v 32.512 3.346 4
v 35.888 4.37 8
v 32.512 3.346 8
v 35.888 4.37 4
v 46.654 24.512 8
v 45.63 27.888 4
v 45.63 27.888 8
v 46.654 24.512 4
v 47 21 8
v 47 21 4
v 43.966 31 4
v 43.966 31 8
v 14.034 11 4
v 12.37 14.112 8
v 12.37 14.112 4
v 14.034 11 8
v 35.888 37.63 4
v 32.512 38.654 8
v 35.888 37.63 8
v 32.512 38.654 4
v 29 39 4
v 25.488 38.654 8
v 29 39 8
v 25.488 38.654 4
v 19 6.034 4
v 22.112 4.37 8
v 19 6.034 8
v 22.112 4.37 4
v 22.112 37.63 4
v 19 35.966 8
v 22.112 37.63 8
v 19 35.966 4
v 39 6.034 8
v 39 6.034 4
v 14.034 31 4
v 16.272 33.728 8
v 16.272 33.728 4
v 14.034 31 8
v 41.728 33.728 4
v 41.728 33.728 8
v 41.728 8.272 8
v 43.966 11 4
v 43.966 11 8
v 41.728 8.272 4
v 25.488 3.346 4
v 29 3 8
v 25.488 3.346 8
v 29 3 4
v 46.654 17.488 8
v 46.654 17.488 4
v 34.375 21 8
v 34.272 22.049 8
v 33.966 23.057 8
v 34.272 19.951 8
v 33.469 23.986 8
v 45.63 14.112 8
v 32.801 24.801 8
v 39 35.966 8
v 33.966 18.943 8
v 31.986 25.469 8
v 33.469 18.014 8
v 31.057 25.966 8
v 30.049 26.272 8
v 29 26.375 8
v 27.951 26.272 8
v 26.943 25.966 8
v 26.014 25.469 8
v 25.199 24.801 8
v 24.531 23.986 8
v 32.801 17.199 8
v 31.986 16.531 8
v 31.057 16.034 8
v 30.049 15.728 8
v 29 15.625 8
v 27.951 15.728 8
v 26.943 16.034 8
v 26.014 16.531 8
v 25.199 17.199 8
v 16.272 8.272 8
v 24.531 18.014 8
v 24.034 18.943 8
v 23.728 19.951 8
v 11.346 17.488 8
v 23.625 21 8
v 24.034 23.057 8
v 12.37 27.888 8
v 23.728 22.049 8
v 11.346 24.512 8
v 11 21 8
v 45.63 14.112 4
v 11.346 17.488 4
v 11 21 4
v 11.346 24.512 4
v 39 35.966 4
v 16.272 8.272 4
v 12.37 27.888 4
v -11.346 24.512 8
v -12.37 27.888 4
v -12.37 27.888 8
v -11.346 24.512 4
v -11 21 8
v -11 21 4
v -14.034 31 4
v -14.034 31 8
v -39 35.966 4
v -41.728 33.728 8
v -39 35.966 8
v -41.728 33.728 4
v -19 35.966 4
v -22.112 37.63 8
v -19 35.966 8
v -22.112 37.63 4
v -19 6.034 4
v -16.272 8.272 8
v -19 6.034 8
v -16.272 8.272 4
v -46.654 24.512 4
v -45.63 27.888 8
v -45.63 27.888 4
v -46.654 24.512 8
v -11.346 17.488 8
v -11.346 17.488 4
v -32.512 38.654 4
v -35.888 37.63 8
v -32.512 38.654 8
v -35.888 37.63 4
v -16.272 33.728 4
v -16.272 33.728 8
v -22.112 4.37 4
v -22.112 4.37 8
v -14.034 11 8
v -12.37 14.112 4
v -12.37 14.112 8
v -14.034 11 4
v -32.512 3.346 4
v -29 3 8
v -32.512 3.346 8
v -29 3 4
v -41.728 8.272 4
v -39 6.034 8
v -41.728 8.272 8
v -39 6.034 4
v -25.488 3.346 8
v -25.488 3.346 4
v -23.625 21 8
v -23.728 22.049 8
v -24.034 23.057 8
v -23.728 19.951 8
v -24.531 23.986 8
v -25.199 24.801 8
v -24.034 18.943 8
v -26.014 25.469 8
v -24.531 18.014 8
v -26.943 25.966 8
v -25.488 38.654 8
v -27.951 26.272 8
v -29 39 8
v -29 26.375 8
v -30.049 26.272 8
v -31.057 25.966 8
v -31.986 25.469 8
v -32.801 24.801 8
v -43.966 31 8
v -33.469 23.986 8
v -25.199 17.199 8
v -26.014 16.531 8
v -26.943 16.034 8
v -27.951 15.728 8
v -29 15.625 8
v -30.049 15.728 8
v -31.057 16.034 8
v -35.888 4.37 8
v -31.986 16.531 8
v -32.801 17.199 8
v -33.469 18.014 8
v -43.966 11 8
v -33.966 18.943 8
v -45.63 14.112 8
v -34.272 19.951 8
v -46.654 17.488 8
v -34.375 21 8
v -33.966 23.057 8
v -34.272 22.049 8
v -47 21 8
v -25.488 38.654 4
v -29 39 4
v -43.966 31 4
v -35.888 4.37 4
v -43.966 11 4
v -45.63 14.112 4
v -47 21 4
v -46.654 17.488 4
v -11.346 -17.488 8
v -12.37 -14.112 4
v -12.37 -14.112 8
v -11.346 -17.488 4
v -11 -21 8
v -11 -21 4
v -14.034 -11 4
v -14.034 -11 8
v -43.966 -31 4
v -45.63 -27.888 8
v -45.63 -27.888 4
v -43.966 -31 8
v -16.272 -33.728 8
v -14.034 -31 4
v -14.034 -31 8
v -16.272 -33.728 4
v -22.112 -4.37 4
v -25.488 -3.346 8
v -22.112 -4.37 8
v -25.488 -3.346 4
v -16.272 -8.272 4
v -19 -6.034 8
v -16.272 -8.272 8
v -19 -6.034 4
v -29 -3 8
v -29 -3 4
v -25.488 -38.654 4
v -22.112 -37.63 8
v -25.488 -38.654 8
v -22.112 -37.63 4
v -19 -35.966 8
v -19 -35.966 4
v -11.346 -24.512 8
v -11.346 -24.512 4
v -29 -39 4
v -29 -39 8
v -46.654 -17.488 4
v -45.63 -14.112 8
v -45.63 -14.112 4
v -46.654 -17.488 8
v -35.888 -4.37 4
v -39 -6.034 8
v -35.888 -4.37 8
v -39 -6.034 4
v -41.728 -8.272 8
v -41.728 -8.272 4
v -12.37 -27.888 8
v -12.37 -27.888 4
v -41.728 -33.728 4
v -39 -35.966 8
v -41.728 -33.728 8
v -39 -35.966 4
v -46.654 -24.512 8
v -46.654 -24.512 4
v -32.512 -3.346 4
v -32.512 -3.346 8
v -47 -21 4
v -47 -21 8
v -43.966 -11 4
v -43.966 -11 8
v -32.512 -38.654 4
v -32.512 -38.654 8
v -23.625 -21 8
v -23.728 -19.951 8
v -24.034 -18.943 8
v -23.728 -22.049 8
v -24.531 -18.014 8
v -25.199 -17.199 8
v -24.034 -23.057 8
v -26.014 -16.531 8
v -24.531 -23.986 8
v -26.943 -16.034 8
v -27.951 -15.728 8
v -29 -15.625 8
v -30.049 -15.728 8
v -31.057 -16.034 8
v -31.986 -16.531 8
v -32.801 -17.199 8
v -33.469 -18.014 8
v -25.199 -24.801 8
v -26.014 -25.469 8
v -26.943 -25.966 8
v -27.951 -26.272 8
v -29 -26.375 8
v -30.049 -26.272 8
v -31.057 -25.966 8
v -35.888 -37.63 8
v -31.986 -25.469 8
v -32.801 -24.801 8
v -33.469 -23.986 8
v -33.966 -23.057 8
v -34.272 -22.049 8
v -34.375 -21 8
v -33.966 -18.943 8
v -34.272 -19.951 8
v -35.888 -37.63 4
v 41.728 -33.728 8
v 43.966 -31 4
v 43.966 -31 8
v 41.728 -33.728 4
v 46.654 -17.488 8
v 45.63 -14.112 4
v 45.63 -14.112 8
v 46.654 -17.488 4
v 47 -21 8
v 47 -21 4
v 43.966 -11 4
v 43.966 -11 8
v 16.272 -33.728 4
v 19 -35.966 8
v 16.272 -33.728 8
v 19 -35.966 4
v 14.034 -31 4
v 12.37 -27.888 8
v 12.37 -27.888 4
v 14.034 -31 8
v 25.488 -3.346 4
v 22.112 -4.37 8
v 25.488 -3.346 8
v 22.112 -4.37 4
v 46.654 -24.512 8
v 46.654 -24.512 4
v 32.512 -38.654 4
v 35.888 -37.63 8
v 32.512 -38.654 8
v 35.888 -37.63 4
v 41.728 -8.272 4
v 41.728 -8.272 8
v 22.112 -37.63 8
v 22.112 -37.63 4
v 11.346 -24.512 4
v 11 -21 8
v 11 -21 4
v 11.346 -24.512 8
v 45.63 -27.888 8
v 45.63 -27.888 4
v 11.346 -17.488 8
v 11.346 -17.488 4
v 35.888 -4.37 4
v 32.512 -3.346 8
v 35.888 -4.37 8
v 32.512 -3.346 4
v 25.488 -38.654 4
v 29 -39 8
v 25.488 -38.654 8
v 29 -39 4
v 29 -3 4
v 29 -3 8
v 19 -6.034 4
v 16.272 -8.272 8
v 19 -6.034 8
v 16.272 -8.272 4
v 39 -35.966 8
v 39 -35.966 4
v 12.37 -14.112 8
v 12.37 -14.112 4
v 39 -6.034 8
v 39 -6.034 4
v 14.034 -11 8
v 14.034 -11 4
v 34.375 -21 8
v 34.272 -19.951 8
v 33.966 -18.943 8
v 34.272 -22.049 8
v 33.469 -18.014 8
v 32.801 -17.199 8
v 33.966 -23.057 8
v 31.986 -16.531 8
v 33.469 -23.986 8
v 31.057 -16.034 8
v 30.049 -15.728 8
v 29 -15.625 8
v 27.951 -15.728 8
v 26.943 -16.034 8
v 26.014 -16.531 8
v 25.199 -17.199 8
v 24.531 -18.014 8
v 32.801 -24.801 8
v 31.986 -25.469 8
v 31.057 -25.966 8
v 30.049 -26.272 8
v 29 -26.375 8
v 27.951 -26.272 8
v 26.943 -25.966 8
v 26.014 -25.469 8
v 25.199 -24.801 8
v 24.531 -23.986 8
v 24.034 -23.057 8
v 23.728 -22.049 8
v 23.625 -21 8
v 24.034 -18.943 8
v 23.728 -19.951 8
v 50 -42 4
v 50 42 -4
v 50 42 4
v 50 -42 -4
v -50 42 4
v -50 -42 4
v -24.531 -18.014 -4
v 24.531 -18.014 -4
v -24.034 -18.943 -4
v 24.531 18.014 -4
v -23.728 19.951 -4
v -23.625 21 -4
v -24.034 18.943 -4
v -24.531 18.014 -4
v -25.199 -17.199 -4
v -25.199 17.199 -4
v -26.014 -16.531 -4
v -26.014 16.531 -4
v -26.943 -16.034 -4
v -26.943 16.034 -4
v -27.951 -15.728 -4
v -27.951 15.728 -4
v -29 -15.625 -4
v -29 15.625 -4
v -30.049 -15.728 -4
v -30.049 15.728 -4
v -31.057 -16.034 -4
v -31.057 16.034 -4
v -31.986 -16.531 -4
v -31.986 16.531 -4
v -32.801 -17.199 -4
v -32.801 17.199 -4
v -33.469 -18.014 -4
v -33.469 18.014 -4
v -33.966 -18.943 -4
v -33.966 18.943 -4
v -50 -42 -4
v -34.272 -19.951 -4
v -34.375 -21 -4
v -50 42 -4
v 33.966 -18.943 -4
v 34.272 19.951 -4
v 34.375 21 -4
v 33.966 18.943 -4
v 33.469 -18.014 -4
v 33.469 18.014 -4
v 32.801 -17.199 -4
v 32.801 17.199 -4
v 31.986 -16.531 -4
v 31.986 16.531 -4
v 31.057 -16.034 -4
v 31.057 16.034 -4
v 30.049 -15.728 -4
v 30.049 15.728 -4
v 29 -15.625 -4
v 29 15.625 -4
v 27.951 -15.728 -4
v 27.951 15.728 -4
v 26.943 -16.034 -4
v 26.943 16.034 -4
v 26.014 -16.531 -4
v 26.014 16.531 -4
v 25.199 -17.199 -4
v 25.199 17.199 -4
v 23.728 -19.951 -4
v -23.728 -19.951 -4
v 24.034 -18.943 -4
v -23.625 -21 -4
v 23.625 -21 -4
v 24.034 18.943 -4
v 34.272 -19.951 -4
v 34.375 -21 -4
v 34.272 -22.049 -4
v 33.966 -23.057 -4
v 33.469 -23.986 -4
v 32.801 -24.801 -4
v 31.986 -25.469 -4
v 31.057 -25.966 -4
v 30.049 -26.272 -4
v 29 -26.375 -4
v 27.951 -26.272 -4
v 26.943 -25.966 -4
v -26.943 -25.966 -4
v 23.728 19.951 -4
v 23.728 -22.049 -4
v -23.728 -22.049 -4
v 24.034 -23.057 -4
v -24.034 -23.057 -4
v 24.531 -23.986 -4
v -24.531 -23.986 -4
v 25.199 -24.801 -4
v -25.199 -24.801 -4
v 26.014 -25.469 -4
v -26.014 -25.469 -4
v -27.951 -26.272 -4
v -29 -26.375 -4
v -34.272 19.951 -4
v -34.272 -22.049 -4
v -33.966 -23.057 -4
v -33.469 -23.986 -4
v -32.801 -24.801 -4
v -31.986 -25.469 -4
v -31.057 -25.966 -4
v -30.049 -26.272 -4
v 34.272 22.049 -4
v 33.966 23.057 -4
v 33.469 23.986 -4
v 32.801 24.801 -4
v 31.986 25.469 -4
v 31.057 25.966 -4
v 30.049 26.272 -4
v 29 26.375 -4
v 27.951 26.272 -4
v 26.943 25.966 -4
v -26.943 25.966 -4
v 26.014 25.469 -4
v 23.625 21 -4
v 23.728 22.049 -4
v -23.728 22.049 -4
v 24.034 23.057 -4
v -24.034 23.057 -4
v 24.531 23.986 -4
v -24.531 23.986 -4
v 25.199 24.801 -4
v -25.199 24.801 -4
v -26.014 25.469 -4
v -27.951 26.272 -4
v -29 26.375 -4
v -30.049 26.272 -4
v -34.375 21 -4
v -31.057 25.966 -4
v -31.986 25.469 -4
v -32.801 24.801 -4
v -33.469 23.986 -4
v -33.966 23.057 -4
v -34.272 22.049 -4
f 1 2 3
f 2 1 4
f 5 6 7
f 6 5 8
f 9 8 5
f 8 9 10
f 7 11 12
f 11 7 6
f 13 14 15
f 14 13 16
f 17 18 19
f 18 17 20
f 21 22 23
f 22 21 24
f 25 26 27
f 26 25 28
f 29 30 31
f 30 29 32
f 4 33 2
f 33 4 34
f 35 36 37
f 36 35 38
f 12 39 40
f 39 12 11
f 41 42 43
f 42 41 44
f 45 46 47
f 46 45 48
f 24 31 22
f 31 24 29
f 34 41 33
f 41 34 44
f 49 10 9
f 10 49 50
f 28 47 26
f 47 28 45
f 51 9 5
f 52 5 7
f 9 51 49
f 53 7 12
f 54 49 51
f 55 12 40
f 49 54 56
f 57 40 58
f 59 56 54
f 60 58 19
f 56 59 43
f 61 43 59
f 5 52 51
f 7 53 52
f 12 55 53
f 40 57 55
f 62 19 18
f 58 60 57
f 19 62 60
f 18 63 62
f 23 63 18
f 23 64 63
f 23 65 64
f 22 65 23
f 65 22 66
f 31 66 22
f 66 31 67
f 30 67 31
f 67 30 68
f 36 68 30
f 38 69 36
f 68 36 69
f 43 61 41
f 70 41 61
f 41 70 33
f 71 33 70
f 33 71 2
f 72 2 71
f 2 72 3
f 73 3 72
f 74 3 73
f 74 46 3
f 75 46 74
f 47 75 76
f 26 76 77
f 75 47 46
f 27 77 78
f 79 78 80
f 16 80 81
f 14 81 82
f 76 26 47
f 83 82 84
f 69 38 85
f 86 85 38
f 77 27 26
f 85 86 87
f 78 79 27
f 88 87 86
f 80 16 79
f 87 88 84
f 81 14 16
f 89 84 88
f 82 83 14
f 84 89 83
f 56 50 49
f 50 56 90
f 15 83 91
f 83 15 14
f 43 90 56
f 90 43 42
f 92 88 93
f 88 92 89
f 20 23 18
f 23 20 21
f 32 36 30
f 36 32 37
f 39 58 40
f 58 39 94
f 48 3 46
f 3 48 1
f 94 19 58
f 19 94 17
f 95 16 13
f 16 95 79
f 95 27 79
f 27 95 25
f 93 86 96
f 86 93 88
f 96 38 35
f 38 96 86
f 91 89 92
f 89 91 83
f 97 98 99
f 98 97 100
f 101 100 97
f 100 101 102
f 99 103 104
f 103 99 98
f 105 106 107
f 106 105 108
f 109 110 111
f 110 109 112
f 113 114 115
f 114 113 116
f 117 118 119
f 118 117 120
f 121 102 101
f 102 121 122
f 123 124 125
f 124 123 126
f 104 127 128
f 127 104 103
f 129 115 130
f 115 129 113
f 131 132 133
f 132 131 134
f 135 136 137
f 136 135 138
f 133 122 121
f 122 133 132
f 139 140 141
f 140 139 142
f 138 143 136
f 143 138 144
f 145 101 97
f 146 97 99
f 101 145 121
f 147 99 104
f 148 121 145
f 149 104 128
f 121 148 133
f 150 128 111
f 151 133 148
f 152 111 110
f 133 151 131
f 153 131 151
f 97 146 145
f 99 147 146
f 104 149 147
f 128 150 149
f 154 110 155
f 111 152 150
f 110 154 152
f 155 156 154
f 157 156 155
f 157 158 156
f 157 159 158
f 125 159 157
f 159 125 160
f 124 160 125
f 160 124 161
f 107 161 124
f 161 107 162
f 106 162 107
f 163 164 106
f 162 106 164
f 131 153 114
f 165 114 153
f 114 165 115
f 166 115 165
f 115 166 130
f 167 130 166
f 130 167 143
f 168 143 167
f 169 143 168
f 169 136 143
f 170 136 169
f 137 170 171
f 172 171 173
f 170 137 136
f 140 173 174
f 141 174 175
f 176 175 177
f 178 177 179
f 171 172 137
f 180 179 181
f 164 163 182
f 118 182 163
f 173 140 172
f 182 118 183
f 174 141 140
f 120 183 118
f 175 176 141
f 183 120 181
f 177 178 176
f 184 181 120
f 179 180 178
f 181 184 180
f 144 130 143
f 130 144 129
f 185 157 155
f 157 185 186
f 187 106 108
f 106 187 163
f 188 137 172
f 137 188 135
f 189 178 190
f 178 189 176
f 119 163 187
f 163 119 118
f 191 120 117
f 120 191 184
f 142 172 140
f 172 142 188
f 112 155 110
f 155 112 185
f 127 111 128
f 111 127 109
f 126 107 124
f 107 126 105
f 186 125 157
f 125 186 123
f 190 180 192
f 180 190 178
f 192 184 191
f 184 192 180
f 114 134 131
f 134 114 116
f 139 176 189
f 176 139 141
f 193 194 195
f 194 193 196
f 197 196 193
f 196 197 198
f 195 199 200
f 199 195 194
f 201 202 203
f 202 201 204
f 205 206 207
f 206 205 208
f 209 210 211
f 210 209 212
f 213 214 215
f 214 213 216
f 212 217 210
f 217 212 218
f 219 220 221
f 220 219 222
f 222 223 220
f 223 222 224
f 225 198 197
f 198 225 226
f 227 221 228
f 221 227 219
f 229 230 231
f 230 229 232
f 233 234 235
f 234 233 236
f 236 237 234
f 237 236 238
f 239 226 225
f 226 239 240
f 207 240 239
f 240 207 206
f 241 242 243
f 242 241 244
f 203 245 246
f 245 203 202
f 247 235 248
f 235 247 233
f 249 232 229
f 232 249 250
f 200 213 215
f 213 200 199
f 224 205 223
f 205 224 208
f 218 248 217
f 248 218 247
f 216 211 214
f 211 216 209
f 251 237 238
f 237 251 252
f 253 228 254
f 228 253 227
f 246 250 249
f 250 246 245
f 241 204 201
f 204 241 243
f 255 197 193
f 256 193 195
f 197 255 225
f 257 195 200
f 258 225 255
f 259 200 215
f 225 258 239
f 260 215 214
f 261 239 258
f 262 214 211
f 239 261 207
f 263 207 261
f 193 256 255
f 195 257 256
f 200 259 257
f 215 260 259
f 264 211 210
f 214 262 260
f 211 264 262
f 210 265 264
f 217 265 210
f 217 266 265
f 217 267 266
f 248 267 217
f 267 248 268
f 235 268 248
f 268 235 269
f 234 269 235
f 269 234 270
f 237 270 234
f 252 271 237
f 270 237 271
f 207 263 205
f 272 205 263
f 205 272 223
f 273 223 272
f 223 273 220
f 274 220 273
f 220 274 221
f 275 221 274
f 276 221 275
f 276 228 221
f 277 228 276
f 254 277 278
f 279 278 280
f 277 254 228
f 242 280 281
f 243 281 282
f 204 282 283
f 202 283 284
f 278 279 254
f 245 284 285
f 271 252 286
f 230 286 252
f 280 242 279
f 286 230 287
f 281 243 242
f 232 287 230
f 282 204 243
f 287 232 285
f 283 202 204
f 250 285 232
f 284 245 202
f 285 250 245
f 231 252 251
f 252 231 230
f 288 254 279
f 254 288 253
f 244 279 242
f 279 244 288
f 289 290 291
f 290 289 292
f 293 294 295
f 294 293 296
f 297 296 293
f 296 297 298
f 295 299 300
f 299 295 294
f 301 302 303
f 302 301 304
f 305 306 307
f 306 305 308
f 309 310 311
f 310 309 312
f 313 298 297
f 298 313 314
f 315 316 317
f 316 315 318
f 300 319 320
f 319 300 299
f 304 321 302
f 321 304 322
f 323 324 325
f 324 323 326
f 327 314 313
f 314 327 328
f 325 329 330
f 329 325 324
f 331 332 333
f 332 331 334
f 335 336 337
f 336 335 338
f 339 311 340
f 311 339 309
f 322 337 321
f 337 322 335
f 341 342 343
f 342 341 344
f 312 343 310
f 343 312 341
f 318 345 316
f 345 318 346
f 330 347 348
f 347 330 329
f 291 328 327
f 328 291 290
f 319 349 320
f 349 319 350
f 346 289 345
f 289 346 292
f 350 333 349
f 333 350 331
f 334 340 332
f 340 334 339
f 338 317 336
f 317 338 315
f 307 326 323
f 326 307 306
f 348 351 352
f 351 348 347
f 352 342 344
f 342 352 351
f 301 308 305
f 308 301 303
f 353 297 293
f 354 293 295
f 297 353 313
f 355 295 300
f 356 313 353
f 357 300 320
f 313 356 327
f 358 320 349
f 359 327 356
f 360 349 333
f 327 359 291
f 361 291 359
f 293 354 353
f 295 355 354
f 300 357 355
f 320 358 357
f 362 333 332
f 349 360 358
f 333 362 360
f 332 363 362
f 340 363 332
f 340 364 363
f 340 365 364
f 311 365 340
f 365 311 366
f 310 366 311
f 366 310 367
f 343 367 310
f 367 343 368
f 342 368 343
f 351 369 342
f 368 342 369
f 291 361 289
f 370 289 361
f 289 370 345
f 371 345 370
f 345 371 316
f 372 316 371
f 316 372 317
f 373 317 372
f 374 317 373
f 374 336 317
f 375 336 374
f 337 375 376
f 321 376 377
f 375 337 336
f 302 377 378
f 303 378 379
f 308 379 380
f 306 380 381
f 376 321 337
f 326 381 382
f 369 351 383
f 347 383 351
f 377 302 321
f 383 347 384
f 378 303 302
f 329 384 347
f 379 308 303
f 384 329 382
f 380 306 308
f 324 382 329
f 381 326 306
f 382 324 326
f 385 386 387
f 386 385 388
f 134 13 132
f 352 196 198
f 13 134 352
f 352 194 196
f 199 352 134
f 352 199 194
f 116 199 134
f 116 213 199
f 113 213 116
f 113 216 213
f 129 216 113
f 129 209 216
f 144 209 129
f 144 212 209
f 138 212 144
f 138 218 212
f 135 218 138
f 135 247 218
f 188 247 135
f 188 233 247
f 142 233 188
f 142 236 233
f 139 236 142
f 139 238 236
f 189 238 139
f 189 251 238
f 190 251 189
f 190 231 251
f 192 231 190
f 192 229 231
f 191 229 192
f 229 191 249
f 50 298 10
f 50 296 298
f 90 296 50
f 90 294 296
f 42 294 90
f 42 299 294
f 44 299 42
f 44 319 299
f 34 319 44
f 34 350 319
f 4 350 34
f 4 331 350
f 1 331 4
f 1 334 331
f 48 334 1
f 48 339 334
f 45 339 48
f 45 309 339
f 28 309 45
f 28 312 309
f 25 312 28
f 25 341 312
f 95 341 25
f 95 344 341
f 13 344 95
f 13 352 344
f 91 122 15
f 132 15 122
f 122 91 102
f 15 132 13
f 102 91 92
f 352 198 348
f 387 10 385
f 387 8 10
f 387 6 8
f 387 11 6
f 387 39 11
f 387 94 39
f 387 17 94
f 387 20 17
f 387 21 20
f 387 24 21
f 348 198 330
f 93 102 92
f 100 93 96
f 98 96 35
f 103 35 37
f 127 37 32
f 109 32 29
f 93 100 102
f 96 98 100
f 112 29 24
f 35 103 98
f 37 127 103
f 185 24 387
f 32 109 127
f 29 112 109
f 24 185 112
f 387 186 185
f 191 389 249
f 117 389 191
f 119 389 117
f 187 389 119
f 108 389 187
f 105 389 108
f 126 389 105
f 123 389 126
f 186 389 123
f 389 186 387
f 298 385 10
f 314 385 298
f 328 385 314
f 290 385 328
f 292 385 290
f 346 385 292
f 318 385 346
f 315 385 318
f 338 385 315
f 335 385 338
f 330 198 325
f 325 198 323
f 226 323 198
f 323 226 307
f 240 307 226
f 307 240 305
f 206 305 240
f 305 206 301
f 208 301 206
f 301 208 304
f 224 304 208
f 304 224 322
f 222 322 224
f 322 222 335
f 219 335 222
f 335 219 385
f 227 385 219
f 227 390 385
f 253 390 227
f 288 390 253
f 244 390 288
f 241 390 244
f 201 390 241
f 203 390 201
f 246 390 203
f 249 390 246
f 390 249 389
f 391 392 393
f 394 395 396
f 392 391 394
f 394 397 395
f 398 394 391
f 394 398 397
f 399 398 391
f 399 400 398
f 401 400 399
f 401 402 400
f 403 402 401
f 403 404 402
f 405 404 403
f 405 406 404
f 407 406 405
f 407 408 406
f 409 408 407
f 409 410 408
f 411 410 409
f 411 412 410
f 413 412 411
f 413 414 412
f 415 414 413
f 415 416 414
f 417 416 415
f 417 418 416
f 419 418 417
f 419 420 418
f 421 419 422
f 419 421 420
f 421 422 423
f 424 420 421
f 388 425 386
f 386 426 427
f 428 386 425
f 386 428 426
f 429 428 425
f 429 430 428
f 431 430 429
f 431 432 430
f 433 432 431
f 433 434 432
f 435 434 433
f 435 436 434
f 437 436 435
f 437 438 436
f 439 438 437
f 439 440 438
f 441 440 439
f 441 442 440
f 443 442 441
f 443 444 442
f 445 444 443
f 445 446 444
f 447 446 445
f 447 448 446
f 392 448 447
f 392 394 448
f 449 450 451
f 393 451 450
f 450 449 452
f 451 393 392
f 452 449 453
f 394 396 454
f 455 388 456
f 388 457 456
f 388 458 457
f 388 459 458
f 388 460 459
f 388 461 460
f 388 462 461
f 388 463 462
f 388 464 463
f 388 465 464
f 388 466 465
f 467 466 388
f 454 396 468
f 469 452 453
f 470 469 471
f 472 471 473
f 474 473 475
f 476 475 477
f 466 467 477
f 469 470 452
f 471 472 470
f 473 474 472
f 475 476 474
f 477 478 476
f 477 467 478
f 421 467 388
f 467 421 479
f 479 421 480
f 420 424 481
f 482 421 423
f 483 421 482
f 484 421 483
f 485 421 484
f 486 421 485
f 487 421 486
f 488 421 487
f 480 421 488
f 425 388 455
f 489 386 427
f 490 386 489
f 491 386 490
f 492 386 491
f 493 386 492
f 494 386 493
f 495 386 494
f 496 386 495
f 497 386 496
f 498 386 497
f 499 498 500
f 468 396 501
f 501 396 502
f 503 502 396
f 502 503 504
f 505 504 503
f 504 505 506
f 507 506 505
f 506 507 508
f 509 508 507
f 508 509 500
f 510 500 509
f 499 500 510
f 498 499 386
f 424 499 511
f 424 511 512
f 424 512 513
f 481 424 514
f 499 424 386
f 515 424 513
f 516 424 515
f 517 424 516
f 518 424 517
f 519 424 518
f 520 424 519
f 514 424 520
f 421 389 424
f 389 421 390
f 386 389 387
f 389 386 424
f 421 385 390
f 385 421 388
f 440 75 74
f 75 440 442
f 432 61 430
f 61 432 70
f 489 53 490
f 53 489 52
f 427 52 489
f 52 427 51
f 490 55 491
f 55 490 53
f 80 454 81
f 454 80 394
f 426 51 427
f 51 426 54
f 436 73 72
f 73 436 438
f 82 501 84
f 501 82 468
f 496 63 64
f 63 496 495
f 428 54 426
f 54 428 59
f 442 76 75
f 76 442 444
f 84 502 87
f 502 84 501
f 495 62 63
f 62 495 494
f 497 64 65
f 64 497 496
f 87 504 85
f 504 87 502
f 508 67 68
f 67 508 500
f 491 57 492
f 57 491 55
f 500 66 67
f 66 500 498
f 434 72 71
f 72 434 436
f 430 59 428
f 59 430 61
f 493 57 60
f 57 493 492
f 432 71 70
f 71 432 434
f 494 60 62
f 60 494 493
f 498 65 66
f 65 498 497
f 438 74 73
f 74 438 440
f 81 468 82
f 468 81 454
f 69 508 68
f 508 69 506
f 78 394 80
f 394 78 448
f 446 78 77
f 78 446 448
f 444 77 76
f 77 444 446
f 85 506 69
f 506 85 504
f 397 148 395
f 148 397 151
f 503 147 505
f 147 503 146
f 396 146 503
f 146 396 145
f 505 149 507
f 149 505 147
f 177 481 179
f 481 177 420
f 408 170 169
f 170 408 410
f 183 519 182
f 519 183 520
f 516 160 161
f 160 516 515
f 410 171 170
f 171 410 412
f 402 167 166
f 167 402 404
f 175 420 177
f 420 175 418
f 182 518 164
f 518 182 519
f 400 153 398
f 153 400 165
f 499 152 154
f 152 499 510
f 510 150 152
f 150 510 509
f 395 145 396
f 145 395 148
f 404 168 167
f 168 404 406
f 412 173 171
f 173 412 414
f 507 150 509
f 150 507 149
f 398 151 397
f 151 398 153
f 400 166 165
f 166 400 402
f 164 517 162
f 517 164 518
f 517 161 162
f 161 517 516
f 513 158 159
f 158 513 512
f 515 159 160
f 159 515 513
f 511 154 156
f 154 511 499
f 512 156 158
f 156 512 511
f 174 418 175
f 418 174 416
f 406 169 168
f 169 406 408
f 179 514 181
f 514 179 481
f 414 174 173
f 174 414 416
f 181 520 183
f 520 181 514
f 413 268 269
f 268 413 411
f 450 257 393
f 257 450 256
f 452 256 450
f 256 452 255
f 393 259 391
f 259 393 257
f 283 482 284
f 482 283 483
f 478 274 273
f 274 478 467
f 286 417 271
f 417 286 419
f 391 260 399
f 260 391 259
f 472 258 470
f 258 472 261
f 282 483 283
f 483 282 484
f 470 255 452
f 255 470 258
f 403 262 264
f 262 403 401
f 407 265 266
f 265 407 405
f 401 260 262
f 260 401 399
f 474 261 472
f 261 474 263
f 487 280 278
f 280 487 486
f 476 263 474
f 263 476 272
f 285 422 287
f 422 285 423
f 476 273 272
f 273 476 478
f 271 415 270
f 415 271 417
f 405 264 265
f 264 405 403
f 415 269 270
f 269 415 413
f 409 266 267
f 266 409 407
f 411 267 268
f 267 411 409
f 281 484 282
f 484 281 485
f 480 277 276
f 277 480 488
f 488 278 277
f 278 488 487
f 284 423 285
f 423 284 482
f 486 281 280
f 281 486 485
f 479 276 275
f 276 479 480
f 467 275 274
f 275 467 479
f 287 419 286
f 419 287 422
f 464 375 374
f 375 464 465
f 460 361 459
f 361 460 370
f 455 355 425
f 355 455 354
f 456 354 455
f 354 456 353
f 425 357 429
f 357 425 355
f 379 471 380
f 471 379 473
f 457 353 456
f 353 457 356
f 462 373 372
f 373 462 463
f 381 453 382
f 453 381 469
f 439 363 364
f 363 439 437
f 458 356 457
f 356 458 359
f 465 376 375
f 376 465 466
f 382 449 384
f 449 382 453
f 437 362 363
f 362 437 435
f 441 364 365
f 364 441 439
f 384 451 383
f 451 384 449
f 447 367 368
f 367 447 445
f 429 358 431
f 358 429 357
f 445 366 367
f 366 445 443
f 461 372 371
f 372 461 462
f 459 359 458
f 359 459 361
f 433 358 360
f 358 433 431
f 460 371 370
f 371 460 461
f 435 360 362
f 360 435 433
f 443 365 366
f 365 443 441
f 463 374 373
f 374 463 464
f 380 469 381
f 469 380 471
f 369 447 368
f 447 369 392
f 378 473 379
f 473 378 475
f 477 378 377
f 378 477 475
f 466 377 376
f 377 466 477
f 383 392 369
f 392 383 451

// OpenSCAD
$fn = 32;

// ----------------------------------------------------------------------
// Anchor pads 100 x 84 x 12
// four corner bosses with anchor holes
// ----------------------------------------------------------------------

// --- parameters (mm) ---
plate = [100, 84, 8];    // base plate size (x, y, z)
pads = 4;                // boss count, one per corner
edge = 21;               // boss centre offset from the plate edge
boss_d = 36;             // boss diameter
boss_h = 4;              // boss height above the base plate
bore_d = 10.5;           // nominal hole diameter from the drawing
print_allowance = 0.25;  // clearance added for printing

// --- derived feature positions (mm) ---
hole_d = bore_d + print_allowance;  // = 10.75   hole diameter as printed
height = plate[2] + boss_h;         // = 12   overall height of the part
corner_x = plate[0] / 2 - edge;     // = 29   boss centre X
corner_y = plate[1] / 2 - edge;     // = 21   boss centre Y
feature_centers = [
  [corner_x, corner_y],
  [-corner_x, corner_y],
  [-corner_x, -corner_y],
  [corner_x, -corner_y]
];   // boss centres, anchor holes are drilled there

// base plate, four bosses standing on it, anchor holes all the way through
difference() {
  union() {
    cube(plate, center = true);
    for (centre = feature_centers)
      translate([centre[0], centre[1], plate[2] / 2 - 1])
        cylinder(d = boss_d, h = boss_h + 1);
  }
  for (centre = feature_centers)
    translate([centre[0], centre[1], -height])
      cylinder(d = hole_d, h = 2 * height + 2);  // through boss and plate
}
